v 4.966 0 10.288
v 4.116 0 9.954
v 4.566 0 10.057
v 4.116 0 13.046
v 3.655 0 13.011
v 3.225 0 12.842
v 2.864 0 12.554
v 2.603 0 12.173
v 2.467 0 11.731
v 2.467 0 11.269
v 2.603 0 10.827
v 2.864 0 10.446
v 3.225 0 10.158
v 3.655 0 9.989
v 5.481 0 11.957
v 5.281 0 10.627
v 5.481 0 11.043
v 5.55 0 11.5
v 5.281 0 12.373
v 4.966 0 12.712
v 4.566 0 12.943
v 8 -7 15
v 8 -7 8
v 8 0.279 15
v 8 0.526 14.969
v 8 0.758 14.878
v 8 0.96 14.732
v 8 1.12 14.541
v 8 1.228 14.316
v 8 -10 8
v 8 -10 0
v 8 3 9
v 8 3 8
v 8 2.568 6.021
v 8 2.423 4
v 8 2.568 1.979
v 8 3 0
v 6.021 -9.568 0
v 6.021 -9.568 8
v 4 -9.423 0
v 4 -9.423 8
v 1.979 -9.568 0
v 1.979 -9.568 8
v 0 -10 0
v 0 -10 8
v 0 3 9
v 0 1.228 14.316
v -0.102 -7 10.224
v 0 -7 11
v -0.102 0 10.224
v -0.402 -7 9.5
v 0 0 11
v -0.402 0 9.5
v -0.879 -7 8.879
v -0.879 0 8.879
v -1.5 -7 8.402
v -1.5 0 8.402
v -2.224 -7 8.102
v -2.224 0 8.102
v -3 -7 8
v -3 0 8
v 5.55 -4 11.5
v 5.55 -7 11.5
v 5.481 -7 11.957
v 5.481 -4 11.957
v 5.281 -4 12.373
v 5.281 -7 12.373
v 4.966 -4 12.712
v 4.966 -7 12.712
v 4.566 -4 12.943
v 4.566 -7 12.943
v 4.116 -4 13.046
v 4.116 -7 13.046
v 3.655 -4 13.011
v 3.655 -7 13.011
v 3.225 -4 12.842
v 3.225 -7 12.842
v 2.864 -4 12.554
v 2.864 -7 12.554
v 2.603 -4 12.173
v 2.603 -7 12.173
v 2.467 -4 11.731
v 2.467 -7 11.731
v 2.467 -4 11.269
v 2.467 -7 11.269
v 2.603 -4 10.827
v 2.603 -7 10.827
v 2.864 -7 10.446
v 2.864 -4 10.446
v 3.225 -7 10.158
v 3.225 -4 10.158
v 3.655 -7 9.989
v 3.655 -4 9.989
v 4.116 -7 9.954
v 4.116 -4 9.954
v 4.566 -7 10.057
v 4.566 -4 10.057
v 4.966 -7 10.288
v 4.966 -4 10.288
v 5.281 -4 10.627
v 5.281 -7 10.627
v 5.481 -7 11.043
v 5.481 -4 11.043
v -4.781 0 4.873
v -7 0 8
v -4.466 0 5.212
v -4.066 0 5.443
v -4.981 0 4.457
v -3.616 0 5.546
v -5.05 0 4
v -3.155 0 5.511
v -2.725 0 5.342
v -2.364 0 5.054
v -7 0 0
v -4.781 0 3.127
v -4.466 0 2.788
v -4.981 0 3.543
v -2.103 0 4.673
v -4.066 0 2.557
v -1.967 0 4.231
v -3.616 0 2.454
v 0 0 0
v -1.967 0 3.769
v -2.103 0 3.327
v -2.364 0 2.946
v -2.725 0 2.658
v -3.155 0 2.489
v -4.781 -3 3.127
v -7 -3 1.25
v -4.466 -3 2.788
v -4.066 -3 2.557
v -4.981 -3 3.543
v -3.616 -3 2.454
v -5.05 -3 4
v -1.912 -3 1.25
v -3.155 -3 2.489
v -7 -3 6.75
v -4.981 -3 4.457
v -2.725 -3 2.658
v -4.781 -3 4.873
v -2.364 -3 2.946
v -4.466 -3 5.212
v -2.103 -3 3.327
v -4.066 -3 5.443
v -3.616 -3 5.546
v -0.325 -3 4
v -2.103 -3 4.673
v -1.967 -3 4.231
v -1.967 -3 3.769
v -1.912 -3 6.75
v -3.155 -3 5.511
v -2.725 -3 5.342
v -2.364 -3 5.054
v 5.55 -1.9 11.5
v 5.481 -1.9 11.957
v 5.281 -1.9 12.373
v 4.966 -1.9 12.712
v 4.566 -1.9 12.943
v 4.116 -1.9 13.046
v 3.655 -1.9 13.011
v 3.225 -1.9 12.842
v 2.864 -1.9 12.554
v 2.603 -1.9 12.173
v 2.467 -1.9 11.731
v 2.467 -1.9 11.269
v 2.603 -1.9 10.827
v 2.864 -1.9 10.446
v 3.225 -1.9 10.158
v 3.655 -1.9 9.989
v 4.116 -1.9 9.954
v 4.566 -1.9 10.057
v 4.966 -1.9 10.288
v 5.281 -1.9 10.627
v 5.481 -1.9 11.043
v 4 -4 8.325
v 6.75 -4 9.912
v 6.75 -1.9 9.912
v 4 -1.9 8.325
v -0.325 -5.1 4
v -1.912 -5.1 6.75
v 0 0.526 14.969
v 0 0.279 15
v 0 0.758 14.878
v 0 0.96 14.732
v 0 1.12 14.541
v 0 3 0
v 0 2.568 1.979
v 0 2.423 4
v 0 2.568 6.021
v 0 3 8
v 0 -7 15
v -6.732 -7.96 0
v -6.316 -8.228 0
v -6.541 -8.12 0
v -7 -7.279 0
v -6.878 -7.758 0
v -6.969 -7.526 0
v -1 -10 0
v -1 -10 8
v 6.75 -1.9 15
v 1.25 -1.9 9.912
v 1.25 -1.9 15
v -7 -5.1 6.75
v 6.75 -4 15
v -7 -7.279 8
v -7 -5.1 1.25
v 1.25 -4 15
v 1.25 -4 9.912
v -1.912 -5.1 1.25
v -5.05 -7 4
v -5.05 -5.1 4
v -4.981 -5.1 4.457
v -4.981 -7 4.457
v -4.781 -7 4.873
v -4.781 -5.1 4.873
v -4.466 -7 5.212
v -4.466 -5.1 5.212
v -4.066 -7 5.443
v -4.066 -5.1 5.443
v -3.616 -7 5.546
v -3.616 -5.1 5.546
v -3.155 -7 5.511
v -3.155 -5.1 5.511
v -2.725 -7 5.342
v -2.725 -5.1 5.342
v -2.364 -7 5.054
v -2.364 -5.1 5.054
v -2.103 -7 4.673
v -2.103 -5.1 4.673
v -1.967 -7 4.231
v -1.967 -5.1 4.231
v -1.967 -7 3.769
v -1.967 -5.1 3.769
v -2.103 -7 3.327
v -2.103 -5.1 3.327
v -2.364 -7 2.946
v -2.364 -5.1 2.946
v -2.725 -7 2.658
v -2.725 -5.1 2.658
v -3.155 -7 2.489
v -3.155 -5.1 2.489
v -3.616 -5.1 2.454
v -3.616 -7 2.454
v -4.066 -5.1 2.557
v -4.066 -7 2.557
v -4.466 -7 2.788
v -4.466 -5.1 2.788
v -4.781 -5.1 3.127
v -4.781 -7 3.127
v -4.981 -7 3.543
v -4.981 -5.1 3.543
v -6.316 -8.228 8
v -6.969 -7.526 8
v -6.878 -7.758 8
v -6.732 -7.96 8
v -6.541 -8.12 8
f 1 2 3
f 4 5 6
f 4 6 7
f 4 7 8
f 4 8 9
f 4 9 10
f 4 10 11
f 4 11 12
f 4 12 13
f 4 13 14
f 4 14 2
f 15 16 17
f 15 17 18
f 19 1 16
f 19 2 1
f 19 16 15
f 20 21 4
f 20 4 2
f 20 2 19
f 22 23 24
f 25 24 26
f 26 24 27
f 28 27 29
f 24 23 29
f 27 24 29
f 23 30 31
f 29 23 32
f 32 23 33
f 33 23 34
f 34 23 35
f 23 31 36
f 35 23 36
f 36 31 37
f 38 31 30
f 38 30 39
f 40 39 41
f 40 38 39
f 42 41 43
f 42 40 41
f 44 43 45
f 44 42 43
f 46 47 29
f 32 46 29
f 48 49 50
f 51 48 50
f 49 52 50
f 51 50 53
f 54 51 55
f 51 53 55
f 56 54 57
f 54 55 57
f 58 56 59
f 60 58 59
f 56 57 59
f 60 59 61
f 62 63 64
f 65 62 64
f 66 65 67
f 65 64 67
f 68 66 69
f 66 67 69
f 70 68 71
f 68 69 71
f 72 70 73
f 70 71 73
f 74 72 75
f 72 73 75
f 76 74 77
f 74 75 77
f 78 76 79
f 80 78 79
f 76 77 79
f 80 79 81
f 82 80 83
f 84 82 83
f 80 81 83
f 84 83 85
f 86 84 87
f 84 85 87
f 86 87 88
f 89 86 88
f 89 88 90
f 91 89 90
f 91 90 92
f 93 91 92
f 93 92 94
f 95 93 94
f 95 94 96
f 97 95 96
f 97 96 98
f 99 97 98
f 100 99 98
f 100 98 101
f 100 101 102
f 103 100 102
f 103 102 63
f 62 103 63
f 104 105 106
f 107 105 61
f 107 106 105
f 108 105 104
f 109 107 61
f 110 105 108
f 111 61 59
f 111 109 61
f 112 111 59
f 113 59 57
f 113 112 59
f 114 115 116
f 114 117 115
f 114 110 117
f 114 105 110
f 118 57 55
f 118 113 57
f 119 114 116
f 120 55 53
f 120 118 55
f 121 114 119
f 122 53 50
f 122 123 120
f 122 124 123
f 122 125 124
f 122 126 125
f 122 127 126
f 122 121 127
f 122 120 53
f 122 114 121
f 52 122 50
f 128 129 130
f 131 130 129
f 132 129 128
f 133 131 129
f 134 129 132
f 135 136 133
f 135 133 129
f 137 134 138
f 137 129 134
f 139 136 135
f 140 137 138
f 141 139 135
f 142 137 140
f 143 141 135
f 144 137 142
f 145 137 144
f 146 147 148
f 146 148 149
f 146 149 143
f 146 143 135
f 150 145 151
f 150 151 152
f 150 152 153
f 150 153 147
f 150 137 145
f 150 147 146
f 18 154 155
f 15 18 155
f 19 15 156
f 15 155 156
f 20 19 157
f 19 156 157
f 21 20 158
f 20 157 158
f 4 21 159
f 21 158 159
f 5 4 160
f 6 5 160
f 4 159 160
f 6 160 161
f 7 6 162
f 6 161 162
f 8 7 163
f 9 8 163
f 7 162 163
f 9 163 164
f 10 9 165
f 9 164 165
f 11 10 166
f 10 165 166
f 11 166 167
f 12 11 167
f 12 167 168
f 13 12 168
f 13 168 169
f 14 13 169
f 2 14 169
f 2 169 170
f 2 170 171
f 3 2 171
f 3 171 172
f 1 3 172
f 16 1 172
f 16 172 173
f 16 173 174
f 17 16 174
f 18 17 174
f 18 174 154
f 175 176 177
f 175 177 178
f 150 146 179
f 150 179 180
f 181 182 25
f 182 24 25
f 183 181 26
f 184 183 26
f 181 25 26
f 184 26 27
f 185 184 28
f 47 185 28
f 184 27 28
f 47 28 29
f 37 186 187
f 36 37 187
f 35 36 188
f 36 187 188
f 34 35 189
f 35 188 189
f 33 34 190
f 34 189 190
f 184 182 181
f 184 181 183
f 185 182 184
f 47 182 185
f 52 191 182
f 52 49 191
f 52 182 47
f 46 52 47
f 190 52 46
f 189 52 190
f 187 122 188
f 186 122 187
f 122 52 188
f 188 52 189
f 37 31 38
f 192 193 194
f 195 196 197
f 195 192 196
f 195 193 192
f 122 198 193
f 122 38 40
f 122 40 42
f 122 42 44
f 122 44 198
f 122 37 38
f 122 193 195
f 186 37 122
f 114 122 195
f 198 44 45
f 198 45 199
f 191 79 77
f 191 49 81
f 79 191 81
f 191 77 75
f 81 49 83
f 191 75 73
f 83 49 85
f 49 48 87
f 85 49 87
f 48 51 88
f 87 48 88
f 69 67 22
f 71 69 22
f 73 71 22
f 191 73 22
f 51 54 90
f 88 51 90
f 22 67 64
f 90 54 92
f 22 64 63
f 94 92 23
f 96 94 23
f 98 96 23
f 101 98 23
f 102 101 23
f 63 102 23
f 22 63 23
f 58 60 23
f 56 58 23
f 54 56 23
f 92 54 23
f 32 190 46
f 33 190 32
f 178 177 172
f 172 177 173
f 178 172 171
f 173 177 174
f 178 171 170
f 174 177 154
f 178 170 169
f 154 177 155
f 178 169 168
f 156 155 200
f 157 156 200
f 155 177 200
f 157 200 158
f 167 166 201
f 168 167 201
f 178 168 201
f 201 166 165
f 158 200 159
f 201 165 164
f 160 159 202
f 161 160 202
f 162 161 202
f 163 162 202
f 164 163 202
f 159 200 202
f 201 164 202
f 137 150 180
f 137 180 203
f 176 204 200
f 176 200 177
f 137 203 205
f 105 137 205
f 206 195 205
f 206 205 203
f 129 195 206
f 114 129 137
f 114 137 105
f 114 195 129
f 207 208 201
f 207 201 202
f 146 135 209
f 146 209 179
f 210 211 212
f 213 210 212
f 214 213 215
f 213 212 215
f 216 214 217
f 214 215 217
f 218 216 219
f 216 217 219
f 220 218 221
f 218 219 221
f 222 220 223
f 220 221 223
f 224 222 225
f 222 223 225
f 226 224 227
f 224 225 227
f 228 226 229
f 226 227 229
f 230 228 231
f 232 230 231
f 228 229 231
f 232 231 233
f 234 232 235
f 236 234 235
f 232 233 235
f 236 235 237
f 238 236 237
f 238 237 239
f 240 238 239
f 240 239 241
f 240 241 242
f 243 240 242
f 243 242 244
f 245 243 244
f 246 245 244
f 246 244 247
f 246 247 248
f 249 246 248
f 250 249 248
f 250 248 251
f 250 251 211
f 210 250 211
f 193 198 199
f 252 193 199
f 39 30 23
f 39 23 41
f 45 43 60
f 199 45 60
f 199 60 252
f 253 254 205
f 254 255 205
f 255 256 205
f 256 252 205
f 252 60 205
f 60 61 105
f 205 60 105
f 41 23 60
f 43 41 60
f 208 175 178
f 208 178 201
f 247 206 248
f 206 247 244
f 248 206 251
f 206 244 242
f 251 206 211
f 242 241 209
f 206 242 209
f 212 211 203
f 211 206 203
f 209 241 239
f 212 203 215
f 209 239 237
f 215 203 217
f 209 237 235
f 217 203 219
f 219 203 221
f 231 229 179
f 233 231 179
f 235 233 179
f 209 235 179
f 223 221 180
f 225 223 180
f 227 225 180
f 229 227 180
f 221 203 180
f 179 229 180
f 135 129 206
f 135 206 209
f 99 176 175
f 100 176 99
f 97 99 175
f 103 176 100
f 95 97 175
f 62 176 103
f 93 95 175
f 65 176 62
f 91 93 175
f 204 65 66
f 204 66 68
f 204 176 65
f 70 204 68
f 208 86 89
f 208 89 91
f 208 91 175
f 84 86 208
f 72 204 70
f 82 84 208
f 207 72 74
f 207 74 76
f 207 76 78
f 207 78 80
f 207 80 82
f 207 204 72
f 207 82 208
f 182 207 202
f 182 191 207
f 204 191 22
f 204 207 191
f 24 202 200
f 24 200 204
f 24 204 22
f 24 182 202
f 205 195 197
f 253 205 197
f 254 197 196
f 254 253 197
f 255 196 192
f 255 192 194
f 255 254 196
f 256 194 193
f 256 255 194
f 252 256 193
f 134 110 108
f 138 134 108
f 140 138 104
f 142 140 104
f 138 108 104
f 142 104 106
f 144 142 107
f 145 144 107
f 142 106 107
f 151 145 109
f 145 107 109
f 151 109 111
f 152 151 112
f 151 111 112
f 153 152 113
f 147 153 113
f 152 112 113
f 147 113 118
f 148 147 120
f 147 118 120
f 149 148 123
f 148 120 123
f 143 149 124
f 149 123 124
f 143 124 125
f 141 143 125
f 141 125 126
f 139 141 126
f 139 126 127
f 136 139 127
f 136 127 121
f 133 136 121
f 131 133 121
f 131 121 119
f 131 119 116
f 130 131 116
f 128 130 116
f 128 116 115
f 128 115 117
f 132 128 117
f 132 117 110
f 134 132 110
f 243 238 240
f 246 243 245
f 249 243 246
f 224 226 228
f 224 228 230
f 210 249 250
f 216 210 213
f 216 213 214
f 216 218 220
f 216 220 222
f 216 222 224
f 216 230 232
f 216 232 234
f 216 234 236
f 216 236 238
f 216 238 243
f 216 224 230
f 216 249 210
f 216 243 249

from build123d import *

# Parameters (mm, degrees)
EXTRUDE002_DEPTH                          = 2.1
EXTRUDE002_ONTO_SKETCH006_ROLL_ANGLE      = 90
EXTRUDE001_DEPTH                          = 2.1
EXTRUDE001_ONTO_SKETCH005_ROLL_ANGLE      = 90
EXTRUDE001_ONTO_SKETCH005_PLACEMENT_ANGLE = 180
EXTRUDE_DEPTH                             = 8
SKETCH001_W                               = 8
SKETCH001_H                               = 10
PAD_DEPTH                                 = 7
POCKET_DEPTH                              = 8.001
SKETCH003_R                               = 1.55
POCKET001_DEPTH                           = 7
SKETCH004_R                               = 1.55
POCKET002_DEPTH                           = 7
CHAMFER_SIZE2                             = 2
CHAMFER_SIZE                              = 6
CHAMFER001_SIZE2                          = 6
CHAMFER001_SIZE                           = 2
FILLET_1_R                                = 3
FILLET_2_R                                = 1


with BuildPart() as extrude002:
    # Sketch006 as drawn → Extrude002 (new)
    with BuildSketch(Plane.XY):
        Polygon((4, 8.324574), (1.25, 9.912287), (1.25, 15), (6.75, 15), (6.75, 9.912287), align=None)
    extrude(amount=-EXTRUDE002_DEPTH)


with BuildPart() as extrude002_1:
    # Extrude002 onto Sketch006 roll: moved
    add(extrude002.part.rotate(Axis((0, 0, 0), (1, 0, 0)), EXTRUDE002_ONTO_SKETCH006_ROLL_ANGLE))


with BuildPart() as extrude002_2:
    # Extrude002 onto Sketch006 placement: moved
    add(extrude002_1.part.moved(Location((0, -7, 0))))


with BuildPart() as extrude002_3:
    # Extrude002 placement: moved
    add(extrude002_2.part.moved(Location((0, 3, 0))))


with BuildPart() as extrude001:
    # Sketch005 as drawn → Extrude001 (new)
    with BuildSketch(Plane.XY):
        Polygon((0.324574, 4), (1.912287, 6.75), (7, 6.75), (7, 1.25), (1.912287, 1.25), align=None)
    extrude(amount=-EXTRUDE001_DEPTH)


with BuildPart() as extrude001_1:
    # Extrude001 onto Sketch005 roll: moved
    add(extrude001.part.rotate(Axis((0, 0, 0), (1, 0, 0)), EXTRUDE001_ONTO_SKETCH005_ROLL_ANGLE))


with BuildPart() as extrude001_2:
    # Extrude001 onto Sketch005 placement: moved
    add(extrude001_1.part.rotate(Axis((0, 0, 0), (0, 0, 1)), EXTRUDE001_ONTO_SKETCH005_PLACEMENT_ANGLE))


with BuildPart() as extrude001_3:
    # Extrude001 placement: moved
    add(extrude001_2.part.moved(Location((0, -3, 0))))


with BuildPart() as fillet_body:
    # Sketch → Extrude (new body)
    with BuildSketch(Plane.XY):
        with BuildLine():
            Line((0, 0), (0, 3))
            Line((0, 3), (8, 3))
            Line((8, 3), (8, -10))
            ThreePointArc((8, -10), (4, -9.422859), (0, -10))
            Line((0, -10), (-7, -10))
            Line((-7, -10), (-7, 0))
            Line((-7, 0), (0, 0))
        make_face()
    extrude(amount=EXTRUDE_DEPTH)

    # Sketch001 → Pad (new body)
    with BuildSketch(Plane.XY.offset(8)):
        with Locations((4, -2)):
            Rectangle(SKETCH001_W, SKETCH001_H)
    extrude(amount=PAD_DEPTH)

    # Sketch002 → Pocket (cut, through all)
    with BuildSketch(Plane(origin=(0, 0, 0), x_dir=(0, -1, 0), z_dir=(-1, 0, 0))):
        with BuildLine():
            Line((-3, 0), (-3, 8))
            ThreePointArc((-3, 0), (-2.422859, 4), (-3, 8))
        make_face()
    extrude(amount=-POCKET_DEPTH, mode=Mode.SUBTRACT)

    # Sketch003 → Pocket001 (cut)
    with BuildSketch(Plane(origin=(0, 0, 0), x_dir=(-1, 0, 0), z_dir=(0, 1, 0))):
        with Locations((3.5, 4)):
            Circle(SKETCH003_R)
    extrude(amount=-POCKET001_DEPTH, mode=Mode.SUBTRACT)

    # Sketch004 → Pocket002 (cut)
    with BuildSketch(Plane.XZ.offset(7)):
        with Locations((4, 11.5)):
            Circle(SKETCH004_R)
    extrude(amount=-POCKET002_DEPTH, mode=Mode.SUBTRACT)

    # Cut: cut Extrude001
    add(extrude001_3.part, mode=Mode.SUBTRACT)

    # Cut001: cut Extrude002
    add(extrude002_3.part, mode=Mode.SUBTRACT)

    # Chamfer
    chamfer_edges = [fillet_body.edges().sort_by_distance(p)[0] for p in [
        (4, 3, 15),
    ]]
    chamfer_side = fillet_body.faces().sort_by_distance((4, 3, 11.5))[0]
    chamfer(chamfer_edges, length=CHAMFER_SIZE, length2=CHAMFER_SIZE2, reference=chamfer_side)

    # Chamfer001
    chamfer001_edges = [fillet_body.edges().sort_by_distance(p)[0] for p in [
        (-7, -10, 4),
    ]]
    chamfer001_side = fillet_body.faces().sort_by_distance((-7, -5.160299, 4))[0]
    chamfer(chamfer001_edges, length=CHAMFER001_SIZE, length2=CHAMFER001_SIZE2, reference=chamfer001_side)

    # Fillet 1
    fillet_1_edges = [fillet_body.edges().sort_by_distance(p)[0] for p in [
        (0, -3.5, 8),
    ]]
    fillet(fillet_1_edges, radius=FILLET_1_R)

    # Fillet 2
    fillet_2_edges = [fillet_body.edges().sort_by_distance(p)[0] for p in [
        (-7, -8, 4),
        (4, 1, 15),
    ]]
    fillet(fillet_2_edges, radius=FILLET_2_R)


solid = fillet_body.part
